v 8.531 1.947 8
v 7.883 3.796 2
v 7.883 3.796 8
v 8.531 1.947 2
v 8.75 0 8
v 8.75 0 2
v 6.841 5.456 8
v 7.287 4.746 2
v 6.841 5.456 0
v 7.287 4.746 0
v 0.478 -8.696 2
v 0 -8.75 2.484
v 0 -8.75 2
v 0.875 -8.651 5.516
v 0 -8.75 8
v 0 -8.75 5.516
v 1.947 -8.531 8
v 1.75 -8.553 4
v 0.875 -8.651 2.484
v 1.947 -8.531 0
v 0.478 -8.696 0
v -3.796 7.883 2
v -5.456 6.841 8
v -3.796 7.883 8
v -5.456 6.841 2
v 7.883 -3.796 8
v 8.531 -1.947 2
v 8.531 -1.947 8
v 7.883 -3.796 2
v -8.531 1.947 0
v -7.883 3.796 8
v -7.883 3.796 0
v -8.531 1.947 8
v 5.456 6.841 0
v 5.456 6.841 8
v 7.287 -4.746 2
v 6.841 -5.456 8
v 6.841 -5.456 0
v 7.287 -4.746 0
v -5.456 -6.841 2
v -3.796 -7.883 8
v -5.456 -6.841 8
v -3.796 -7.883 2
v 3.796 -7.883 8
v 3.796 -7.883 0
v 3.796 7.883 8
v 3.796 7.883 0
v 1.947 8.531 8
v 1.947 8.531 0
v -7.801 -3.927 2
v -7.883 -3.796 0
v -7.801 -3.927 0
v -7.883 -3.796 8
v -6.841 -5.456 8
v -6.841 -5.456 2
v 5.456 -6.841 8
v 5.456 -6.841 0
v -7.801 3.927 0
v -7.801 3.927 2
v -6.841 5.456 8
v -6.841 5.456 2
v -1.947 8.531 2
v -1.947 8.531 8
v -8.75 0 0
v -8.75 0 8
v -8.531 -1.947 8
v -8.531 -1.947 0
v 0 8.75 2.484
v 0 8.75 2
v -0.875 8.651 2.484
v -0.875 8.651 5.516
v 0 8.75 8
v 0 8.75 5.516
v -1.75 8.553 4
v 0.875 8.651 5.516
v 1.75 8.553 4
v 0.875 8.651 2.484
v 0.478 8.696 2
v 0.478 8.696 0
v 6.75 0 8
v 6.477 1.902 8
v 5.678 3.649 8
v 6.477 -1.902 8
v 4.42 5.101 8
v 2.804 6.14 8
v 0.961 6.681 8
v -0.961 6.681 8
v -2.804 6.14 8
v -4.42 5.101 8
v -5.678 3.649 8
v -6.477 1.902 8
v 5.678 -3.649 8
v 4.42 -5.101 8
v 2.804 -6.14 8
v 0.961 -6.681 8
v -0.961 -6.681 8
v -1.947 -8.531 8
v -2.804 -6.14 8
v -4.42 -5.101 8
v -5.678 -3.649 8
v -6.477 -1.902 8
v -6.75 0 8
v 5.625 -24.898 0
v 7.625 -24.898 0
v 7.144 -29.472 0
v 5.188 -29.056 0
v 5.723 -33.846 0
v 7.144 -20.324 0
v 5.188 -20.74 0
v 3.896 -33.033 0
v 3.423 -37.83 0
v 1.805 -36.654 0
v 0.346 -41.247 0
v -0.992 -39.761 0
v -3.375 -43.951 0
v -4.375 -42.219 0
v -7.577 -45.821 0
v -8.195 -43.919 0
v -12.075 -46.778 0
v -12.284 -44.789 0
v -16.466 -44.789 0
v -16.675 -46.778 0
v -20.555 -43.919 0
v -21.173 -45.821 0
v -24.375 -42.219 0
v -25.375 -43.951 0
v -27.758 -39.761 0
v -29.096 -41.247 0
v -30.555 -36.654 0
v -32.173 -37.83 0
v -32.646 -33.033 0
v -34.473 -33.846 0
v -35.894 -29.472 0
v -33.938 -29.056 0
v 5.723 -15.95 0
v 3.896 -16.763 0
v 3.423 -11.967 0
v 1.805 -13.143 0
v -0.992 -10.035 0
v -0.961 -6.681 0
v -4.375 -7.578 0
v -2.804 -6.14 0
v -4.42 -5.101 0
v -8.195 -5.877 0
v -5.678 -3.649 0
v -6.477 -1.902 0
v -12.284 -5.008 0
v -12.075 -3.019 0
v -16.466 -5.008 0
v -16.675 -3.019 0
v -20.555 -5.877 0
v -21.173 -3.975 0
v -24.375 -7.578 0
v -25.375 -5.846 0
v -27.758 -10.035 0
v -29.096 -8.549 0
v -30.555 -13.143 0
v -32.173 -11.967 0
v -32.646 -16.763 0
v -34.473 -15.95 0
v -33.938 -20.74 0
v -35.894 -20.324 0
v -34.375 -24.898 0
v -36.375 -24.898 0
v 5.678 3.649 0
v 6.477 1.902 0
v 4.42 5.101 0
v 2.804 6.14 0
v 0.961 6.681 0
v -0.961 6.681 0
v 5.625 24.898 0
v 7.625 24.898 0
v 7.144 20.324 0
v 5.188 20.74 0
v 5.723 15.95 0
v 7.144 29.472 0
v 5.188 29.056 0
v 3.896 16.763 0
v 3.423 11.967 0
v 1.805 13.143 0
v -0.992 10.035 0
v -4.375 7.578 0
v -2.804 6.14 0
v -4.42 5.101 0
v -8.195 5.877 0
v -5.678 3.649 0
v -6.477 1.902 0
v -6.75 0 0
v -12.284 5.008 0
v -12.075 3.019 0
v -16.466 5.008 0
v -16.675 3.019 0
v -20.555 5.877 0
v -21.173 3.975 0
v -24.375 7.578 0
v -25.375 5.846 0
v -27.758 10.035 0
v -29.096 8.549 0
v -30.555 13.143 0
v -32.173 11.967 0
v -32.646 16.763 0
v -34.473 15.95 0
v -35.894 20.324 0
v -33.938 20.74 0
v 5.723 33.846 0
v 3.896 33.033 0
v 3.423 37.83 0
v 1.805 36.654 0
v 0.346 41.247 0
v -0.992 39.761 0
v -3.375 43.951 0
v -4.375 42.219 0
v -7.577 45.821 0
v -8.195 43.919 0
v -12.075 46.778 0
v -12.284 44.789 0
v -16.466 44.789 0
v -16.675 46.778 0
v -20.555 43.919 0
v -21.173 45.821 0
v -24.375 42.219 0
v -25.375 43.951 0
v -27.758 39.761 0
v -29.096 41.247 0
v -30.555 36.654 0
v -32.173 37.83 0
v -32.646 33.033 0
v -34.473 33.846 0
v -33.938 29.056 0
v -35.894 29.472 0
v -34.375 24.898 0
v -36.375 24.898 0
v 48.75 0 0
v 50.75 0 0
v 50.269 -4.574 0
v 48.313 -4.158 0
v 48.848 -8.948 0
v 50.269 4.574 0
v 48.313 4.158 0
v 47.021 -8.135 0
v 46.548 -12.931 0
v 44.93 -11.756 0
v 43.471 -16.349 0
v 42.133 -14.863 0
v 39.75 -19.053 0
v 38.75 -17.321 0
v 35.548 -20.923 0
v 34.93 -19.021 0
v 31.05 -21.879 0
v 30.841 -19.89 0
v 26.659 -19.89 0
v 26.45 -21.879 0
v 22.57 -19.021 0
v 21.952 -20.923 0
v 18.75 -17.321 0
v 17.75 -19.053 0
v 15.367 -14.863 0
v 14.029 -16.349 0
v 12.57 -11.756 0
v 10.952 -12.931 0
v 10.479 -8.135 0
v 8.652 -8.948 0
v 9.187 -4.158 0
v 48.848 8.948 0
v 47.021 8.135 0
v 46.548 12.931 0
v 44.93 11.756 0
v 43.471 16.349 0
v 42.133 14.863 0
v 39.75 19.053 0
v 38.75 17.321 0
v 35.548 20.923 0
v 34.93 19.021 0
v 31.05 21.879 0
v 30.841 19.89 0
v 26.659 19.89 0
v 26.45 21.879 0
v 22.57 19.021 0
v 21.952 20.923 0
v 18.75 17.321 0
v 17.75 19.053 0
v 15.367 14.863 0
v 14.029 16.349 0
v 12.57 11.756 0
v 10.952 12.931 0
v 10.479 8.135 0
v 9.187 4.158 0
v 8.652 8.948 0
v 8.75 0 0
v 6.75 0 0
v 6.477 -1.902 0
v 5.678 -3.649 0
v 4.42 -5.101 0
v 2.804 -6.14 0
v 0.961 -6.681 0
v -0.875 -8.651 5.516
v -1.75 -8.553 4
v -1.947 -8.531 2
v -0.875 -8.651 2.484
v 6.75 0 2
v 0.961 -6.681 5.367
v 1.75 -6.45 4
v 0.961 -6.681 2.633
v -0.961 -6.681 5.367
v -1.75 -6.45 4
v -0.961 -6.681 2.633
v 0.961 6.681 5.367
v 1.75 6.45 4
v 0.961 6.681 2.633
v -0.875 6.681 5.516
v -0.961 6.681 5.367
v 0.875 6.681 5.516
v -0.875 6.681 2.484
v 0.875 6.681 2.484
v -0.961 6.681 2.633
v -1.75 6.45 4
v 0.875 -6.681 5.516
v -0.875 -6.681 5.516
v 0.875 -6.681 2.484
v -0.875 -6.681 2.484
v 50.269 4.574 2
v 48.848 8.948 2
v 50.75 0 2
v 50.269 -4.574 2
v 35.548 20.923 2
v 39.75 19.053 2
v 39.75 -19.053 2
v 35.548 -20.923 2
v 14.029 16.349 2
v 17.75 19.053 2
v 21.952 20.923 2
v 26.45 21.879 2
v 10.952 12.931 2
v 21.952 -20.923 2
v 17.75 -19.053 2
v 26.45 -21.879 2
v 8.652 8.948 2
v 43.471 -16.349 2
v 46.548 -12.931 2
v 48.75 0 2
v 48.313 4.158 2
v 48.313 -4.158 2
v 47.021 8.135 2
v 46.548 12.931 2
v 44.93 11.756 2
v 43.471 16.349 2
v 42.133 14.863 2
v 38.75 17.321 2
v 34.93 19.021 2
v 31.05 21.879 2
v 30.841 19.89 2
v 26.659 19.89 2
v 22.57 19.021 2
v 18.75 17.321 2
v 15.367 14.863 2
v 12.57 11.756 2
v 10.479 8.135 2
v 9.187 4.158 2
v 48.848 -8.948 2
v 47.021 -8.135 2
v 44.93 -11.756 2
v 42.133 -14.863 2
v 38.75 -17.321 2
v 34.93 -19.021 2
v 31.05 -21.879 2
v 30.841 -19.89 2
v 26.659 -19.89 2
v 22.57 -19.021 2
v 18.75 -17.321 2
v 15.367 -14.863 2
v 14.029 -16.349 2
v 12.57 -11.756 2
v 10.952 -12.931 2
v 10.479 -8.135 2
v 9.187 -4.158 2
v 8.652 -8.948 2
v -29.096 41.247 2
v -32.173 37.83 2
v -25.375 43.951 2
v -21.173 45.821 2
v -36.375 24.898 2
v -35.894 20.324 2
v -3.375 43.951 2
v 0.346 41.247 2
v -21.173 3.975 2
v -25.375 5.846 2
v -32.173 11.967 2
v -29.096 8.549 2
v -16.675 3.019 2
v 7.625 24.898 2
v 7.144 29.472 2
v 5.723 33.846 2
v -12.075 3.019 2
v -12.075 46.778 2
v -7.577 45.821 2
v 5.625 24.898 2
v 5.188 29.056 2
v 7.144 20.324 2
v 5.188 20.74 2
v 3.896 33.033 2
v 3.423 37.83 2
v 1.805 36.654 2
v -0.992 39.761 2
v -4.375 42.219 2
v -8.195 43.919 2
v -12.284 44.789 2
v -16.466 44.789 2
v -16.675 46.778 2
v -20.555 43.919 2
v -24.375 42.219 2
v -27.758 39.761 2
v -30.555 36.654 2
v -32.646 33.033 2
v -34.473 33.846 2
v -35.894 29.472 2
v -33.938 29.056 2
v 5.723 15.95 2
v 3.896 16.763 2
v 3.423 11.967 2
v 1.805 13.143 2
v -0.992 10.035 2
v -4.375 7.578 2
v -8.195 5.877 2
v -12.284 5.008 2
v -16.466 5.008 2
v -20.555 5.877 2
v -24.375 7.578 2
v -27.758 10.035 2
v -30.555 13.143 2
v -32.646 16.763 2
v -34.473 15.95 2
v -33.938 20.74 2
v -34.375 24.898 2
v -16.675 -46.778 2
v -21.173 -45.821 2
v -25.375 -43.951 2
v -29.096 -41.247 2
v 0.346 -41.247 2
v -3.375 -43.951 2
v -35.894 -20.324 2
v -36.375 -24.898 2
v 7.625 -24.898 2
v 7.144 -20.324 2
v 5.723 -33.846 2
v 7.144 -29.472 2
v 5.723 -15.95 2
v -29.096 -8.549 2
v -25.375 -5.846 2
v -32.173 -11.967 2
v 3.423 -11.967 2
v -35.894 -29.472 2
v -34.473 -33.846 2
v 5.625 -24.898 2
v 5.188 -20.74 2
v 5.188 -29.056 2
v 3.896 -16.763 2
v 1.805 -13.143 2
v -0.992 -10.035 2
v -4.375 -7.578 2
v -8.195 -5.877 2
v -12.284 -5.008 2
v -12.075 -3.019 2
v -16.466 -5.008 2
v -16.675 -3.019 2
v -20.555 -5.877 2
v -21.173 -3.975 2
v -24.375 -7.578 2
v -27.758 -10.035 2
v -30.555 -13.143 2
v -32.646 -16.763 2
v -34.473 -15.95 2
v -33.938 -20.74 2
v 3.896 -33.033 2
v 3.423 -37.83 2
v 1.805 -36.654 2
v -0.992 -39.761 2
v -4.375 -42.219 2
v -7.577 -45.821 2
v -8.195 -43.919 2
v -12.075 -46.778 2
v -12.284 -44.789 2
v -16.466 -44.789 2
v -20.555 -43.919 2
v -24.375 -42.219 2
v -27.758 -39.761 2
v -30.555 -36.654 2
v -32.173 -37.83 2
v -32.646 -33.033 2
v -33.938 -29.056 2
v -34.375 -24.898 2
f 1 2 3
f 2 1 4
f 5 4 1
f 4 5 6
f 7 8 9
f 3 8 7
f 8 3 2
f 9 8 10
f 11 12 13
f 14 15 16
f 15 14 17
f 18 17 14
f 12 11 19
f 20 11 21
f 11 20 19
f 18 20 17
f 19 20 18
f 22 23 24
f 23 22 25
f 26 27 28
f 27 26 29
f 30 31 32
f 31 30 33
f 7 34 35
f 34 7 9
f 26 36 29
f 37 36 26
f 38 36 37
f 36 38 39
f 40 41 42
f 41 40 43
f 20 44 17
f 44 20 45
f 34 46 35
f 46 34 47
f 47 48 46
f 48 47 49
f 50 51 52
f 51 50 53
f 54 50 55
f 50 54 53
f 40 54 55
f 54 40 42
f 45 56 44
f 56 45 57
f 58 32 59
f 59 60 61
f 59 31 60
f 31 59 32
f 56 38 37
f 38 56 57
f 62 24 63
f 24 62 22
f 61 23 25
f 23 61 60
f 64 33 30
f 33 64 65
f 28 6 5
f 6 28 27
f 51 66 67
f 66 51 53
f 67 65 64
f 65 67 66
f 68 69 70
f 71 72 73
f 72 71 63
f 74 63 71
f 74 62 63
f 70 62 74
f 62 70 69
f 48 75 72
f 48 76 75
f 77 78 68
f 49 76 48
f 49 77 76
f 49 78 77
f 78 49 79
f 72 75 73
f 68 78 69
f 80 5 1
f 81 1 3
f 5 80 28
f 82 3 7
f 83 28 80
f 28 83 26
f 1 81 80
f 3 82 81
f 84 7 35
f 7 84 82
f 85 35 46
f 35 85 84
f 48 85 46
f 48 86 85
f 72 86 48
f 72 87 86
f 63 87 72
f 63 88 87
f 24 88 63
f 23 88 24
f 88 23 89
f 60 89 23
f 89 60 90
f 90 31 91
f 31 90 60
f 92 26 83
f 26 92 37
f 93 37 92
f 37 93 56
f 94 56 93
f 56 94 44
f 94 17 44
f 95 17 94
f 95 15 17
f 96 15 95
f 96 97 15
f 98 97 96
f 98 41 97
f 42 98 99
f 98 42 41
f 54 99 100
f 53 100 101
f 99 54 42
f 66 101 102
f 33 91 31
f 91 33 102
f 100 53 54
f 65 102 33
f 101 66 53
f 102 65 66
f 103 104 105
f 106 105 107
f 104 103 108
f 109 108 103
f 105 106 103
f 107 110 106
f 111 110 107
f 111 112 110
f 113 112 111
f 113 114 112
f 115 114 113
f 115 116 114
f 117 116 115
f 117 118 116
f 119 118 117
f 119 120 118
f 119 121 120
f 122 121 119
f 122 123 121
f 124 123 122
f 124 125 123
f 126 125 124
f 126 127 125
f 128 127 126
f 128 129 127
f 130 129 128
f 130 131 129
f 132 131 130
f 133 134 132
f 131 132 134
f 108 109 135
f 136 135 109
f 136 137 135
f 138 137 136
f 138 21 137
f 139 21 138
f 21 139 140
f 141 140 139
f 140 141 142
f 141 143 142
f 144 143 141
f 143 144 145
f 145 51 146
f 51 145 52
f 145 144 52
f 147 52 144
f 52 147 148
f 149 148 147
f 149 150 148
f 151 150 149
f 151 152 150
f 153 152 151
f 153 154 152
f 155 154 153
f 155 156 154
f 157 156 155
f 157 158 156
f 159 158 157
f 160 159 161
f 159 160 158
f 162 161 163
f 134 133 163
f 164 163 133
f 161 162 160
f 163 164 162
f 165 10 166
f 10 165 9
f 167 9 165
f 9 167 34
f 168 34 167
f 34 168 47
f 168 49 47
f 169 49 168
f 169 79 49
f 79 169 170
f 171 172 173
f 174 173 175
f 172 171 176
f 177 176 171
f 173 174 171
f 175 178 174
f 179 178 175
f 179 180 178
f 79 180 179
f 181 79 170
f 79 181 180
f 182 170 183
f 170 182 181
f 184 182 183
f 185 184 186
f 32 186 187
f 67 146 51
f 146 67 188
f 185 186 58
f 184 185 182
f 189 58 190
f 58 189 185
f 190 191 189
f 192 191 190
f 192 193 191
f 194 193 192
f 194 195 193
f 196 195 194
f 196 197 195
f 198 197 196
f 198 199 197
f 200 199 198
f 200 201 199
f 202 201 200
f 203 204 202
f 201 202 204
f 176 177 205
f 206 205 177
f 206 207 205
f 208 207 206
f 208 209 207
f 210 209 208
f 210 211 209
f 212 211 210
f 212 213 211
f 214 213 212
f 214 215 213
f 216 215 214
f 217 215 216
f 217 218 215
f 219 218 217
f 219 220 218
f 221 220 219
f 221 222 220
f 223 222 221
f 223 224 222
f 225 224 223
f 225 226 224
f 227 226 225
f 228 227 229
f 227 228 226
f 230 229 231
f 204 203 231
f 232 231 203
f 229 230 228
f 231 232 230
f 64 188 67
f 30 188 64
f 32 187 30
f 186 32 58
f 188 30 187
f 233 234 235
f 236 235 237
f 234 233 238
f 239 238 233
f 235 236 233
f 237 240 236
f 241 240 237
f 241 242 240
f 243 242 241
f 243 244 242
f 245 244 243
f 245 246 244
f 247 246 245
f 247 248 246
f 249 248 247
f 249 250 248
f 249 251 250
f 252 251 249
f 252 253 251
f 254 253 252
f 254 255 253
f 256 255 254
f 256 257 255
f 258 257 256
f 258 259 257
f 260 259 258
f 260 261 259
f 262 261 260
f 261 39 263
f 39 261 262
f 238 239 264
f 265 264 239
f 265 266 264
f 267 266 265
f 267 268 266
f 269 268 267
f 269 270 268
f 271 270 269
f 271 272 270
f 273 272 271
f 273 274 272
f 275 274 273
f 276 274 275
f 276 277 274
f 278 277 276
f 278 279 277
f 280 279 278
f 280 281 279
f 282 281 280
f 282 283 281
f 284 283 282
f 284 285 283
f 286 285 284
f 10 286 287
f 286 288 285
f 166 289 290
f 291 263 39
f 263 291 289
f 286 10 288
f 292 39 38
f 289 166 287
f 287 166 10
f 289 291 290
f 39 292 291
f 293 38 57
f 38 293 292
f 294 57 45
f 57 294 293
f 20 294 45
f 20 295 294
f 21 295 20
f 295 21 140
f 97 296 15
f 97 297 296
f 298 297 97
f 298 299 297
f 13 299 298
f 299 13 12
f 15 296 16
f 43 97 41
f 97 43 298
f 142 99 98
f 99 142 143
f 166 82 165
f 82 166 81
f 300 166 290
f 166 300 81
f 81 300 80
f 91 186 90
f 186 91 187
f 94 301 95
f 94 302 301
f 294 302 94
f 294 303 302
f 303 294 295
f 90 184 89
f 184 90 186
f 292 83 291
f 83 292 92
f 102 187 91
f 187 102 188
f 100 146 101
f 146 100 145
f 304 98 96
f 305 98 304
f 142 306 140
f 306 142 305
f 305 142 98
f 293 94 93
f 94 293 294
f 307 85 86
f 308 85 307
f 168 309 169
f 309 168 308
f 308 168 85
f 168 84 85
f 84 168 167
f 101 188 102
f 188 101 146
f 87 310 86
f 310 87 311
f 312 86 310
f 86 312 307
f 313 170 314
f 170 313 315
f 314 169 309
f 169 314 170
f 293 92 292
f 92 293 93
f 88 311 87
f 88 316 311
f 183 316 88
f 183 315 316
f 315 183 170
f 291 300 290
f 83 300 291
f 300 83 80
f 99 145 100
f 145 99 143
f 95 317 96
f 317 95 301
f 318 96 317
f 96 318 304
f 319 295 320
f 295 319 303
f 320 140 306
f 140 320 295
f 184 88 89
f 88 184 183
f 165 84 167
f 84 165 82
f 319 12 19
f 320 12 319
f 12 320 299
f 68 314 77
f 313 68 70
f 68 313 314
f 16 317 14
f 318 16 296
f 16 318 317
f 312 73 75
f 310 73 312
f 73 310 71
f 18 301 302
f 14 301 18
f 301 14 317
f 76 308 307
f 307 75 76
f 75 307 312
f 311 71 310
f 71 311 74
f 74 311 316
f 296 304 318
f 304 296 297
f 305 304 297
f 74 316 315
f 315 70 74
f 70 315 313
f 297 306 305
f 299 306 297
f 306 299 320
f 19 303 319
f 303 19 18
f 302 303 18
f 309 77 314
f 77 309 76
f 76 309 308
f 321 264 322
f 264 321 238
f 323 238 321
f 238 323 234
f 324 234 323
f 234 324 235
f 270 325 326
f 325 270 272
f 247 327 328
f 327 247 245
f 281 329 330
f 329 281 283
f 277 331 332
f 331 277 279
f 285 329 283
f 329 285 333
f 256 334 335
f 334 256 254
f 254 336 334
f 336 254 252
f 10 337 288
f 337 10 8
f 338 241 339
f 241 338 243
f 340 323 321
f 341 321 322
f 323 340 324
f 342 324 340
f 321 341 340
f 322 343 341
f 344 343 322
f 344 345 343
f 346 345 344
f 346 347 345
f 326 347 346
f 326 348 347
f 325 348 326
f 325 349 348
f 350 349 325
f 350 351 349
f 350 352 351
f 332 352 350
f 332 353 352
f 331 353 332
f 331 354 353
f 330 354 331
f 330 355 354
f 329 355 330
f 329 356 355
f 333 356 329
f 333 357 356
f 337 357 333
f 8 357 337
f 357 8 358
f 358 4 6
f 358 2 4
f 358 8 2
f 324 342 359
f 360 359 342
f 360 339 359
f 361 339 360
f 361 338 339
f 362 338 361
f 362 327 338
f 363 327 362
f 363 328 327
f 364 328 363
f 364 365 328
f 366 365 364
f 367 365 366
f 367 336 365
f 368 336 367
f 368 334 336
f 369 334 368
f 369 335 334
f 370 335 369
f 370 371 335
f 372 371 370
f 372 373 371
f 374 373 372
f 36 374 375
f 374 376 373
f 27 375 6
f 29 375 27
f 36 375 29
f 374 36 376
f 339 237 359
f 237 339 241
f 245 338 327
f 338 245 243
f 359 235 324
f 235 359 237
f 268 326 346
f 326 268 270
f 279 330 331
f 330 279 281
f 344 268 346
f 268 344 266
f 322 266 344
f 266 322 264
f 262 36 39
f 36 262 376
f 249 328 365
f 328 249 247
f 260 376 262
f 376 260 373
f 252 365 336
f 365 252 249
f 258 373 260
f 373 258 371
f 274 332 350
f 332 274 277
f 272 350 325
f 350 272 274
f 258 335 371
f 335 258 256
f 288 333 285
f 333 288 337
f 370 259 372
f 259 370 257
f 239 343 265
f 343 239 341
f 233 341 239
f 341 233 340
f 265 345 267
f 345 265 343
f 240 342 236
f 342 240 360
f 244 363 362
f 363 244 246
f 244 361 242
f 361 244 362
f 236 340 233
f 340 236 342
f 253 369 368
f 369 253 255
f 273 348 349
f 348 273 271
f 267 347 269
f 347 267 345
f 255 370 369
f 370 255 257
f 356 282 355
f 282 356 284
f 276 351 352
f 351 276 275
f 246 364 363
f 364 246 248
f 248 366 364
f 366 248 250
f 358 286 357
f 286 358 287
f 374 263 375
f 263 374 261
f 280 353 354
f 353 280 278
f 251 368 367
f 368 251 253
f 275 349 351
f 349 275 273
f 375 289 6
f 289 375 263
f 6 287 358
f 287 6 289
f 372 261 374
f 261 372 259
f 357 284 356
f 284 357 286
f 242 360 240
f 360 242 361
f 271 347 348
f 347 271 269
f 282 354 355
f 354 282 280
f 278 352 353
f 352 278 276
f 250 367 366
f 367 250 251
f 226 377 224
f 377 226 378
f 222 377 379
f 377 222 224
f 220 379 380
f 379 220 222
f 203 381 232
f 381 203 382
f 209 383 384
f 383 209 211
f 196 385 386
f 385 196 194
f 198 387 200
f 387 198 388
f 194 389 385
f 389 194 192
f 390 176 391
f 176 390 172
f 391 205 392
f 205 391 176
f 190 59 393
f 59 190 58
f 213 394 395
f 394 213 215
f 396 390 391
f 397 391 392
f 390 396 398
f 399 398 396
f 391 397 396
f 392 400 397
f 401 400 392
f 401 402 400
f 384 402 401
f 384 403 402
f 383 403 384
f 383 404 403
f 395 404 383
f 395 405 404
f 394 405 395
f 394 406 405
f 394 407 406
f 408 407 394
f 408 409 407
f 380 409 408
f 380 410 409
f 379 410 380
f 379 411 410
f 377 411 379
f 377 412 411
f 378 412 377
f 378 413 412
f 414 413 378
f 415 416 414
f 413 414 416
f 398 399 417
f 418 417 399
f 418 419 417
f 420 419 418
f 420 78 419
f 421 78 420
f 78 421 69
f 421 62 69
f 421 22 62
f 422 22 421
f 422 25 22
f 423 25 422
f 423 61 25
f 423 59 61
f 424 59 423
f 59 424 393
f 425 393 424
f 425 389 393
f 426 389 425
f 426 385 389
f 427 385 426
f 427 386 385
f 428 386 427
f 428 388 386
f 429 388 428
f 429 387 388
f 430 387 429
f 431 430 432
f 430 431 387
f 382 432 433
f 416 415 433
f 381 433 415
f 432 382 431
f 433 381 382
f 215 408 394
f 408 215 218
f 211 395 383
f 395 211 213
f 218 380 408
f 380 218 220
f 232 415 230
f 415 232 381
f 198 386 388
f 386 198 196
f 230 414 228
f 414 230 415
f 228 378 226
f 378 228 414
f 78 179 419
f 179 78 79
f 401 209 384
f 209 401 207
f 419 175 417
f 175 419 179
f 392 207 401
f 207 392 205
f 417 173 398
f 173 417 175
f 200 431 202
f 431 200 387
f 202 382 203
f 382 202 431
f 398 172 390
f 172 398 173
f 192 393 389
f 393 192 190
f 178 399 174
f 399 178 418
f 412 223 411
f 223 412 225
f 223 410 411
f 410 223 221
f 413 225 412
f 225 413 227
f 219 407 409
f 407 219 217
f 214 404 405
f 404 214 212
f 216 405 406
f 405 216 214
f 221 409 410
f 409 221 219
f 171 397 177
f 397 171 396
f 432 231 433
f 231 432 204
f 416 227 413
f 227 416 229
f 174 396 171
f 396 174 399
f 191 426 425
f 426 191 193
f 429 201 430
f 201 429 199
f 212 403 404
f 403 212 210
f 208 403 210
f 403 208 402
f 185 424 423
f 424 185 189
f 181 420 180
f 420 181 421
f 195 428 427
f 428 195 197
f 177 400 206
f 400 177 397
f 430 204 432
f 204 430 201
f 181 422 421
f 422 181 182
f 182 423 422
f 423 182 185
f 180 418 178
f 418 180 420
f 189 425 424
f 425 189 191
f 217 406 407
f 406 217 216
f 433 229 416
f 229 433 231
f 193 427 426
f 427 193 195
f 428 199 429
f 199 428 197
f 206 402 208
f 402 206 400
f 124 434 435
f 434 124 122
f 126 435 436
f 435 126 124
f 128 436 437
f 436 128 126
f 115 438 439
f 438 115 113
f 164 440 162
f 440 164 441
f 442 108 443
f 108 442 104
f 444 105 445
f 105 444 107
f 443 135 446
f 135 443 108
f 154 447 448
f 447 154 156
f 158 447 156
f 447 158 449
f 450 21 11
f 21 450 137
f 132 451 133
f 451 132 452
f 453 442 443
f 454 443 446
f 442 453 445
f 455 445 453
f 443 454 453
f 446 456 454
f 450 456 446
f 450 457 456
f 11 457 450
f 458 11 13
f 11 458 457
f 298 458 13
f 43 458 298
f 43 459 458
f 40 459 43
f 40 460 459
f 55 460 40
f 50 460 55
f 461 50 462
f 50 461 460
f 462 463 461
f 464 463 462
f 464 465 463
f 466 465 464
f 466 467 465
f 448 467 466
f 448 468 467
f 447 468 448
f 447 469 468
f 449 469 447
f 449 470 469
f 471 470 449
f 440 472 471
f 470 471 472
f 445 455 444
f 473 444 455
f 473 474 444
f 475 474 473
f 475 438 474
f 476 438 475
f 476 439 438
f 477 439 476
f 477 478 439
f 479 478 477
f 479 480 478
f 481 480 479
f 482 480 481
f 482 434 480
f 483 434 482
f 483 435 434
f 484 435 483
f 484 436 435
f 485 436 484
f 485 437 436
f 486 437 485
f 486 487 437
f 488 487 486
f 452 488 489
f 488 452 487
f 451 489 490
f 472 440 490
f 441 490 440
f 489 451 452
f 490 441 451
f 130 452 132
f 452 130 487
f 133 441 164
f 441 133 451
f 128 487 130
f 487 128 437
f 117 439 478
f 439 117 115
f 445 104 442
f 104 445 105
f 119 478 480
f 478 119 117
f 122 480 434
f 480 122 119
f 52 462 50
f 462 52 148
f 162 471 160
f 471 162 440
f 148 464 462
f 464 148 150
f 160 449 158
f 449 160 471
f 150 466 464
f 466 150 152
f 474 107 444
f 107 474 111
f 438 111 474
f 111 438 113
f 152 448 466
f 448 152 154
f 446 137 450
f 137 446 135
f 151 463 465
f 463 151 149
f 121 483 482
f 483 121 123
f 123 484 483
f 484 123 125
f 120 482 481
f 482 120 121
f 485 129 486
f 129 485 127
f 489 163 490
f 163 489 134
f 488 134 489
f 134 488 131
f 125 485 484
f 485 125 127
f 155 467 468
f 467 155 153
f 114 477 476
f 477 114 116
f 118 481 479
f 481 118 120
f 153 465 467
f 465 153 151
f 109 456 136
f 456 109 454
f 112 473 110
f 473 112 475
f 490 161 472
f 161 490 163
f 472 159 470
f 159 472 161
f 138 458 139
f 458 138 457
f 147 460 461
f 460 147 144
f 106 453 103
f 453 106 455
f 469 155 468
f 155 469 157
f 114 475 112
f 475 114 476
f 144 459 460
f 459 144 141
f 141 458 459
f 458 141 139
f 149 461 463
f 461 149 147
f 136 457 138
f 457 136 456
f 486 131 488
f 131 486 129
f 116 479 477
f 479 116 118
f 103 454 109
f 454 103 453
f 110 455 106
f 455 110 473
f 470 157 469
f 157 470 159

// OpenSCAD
ball_od = 40;
support_od = 13.5000000000;
thick = 2;
ofset_length = 28.7500000000;

union() {
	difference() {
		cylinder(d = (support_od + (2 * thick)), h = (thick * 4));
		translate(v = [0, 0, (-((thick * 4) / 2))]) {
			cylinder(d = support_od, h = (2 * (thick * 4)));
		}
		translate(v = [0, 10, 0]) {
			translate(v = [0, 0, ((thick * 4) / 2)]) {
				rotate(a = [90, 0, 0]) {
					cylinder(d = 3.5000000000, h = 20);
				}
			}
		}
	}
	translate(v = [ofset_length, 0, 0]) {
		difference() {
			cylinder(d = (ball_od + (2 * thick)), h = thick);
			translate(v = [0, 0, (-(thick / 2))]) {
				cylinder(d = ball_od, h = (2 * thick));
			}
		}
	}
	translate(v = [0, 0, (thick / 2)]) {
		translate(v = [((support_od / 2) + (((ofset_length - (support_od / 2)) - (ball_od / 2)) / 2)), 0, 0]) {
			cube(center = true, size = [((ofset_length - (support_od / 2)) - (ball_od / 2)), thick, thick]);
		}
	}
	rotate(a = [0, 0, 0.0000000000]) {
		union() {
			translate(v = [ofset_length, 0, 0]) {
				difference() {
					cylinder(d = (ball_od + (2 * thick)), h = thick);
					translate(v = [0, 0, (-(thick / 2))]) {
						cylinder(d = ball_od, h = (2 * thick));
					}
				}
			}
			translate(v = [0, 0, (thick / 2)]) {
				translate(v = [((support_od / 2) + (((ofset_length - (support_od / 2)) - (ball_od / 2)) / 2)), 0, 0]) {
					cube(center = true, size = [((ofset_length - (support_od / 2)) - (ball_od / 2)), thick, thick]);
				}
			}
		}
	}
	rotate(a = [0, 0, 120.0000000000]) {
		union() {
			translate(v = [ofset_length, 0, 0]) {
				difference() {
					cylinder(d = (ball_od + (2 * thick)), h = thick);
					translate(v = [0, 0, (-(thick / 2))]) {
						cylinder(d = ball_od, h = (2 * thick));
					}
				}
			}
			translate(v = [0, 0, (thick / 2)]) {
				translate(v = [((support_od / 2) + (((ofset_length - (support_od / 2)) - (ball_od / 2)) / 2)), 0, 0]) {
					cube(center = true, size = [((ofset_length - (support_od / 2)) - (ball_od / 2)), thick, thick]);
				}
			}
		}
	}
	rotate(a = [0, 0, 240.0000000000]) {
		union() {
			translate(v = [ofset_length, 0, 0]) {
				difference() {
					cylinder(d = (ball_od + (2 * thick)), h = thick);
					translate(v = [0, 0, (-(thick / 2))]) {
						cylinder(d = ball_od, h = (2 * thick));
					}
				}
			}
			translate(v = [0, 0, (thick / 2)]) {
				translate(v = [((support_od / 2) + (((ofset_length - (support_od / 2)) - (ball_od / 2)) / 2)), 0, 0]) {
					cube(center = true, size = [((ofset_length - (support_od / 2)) - (ball_od / 2)), thick, thick]);
				}
			}
		}
	}
}
